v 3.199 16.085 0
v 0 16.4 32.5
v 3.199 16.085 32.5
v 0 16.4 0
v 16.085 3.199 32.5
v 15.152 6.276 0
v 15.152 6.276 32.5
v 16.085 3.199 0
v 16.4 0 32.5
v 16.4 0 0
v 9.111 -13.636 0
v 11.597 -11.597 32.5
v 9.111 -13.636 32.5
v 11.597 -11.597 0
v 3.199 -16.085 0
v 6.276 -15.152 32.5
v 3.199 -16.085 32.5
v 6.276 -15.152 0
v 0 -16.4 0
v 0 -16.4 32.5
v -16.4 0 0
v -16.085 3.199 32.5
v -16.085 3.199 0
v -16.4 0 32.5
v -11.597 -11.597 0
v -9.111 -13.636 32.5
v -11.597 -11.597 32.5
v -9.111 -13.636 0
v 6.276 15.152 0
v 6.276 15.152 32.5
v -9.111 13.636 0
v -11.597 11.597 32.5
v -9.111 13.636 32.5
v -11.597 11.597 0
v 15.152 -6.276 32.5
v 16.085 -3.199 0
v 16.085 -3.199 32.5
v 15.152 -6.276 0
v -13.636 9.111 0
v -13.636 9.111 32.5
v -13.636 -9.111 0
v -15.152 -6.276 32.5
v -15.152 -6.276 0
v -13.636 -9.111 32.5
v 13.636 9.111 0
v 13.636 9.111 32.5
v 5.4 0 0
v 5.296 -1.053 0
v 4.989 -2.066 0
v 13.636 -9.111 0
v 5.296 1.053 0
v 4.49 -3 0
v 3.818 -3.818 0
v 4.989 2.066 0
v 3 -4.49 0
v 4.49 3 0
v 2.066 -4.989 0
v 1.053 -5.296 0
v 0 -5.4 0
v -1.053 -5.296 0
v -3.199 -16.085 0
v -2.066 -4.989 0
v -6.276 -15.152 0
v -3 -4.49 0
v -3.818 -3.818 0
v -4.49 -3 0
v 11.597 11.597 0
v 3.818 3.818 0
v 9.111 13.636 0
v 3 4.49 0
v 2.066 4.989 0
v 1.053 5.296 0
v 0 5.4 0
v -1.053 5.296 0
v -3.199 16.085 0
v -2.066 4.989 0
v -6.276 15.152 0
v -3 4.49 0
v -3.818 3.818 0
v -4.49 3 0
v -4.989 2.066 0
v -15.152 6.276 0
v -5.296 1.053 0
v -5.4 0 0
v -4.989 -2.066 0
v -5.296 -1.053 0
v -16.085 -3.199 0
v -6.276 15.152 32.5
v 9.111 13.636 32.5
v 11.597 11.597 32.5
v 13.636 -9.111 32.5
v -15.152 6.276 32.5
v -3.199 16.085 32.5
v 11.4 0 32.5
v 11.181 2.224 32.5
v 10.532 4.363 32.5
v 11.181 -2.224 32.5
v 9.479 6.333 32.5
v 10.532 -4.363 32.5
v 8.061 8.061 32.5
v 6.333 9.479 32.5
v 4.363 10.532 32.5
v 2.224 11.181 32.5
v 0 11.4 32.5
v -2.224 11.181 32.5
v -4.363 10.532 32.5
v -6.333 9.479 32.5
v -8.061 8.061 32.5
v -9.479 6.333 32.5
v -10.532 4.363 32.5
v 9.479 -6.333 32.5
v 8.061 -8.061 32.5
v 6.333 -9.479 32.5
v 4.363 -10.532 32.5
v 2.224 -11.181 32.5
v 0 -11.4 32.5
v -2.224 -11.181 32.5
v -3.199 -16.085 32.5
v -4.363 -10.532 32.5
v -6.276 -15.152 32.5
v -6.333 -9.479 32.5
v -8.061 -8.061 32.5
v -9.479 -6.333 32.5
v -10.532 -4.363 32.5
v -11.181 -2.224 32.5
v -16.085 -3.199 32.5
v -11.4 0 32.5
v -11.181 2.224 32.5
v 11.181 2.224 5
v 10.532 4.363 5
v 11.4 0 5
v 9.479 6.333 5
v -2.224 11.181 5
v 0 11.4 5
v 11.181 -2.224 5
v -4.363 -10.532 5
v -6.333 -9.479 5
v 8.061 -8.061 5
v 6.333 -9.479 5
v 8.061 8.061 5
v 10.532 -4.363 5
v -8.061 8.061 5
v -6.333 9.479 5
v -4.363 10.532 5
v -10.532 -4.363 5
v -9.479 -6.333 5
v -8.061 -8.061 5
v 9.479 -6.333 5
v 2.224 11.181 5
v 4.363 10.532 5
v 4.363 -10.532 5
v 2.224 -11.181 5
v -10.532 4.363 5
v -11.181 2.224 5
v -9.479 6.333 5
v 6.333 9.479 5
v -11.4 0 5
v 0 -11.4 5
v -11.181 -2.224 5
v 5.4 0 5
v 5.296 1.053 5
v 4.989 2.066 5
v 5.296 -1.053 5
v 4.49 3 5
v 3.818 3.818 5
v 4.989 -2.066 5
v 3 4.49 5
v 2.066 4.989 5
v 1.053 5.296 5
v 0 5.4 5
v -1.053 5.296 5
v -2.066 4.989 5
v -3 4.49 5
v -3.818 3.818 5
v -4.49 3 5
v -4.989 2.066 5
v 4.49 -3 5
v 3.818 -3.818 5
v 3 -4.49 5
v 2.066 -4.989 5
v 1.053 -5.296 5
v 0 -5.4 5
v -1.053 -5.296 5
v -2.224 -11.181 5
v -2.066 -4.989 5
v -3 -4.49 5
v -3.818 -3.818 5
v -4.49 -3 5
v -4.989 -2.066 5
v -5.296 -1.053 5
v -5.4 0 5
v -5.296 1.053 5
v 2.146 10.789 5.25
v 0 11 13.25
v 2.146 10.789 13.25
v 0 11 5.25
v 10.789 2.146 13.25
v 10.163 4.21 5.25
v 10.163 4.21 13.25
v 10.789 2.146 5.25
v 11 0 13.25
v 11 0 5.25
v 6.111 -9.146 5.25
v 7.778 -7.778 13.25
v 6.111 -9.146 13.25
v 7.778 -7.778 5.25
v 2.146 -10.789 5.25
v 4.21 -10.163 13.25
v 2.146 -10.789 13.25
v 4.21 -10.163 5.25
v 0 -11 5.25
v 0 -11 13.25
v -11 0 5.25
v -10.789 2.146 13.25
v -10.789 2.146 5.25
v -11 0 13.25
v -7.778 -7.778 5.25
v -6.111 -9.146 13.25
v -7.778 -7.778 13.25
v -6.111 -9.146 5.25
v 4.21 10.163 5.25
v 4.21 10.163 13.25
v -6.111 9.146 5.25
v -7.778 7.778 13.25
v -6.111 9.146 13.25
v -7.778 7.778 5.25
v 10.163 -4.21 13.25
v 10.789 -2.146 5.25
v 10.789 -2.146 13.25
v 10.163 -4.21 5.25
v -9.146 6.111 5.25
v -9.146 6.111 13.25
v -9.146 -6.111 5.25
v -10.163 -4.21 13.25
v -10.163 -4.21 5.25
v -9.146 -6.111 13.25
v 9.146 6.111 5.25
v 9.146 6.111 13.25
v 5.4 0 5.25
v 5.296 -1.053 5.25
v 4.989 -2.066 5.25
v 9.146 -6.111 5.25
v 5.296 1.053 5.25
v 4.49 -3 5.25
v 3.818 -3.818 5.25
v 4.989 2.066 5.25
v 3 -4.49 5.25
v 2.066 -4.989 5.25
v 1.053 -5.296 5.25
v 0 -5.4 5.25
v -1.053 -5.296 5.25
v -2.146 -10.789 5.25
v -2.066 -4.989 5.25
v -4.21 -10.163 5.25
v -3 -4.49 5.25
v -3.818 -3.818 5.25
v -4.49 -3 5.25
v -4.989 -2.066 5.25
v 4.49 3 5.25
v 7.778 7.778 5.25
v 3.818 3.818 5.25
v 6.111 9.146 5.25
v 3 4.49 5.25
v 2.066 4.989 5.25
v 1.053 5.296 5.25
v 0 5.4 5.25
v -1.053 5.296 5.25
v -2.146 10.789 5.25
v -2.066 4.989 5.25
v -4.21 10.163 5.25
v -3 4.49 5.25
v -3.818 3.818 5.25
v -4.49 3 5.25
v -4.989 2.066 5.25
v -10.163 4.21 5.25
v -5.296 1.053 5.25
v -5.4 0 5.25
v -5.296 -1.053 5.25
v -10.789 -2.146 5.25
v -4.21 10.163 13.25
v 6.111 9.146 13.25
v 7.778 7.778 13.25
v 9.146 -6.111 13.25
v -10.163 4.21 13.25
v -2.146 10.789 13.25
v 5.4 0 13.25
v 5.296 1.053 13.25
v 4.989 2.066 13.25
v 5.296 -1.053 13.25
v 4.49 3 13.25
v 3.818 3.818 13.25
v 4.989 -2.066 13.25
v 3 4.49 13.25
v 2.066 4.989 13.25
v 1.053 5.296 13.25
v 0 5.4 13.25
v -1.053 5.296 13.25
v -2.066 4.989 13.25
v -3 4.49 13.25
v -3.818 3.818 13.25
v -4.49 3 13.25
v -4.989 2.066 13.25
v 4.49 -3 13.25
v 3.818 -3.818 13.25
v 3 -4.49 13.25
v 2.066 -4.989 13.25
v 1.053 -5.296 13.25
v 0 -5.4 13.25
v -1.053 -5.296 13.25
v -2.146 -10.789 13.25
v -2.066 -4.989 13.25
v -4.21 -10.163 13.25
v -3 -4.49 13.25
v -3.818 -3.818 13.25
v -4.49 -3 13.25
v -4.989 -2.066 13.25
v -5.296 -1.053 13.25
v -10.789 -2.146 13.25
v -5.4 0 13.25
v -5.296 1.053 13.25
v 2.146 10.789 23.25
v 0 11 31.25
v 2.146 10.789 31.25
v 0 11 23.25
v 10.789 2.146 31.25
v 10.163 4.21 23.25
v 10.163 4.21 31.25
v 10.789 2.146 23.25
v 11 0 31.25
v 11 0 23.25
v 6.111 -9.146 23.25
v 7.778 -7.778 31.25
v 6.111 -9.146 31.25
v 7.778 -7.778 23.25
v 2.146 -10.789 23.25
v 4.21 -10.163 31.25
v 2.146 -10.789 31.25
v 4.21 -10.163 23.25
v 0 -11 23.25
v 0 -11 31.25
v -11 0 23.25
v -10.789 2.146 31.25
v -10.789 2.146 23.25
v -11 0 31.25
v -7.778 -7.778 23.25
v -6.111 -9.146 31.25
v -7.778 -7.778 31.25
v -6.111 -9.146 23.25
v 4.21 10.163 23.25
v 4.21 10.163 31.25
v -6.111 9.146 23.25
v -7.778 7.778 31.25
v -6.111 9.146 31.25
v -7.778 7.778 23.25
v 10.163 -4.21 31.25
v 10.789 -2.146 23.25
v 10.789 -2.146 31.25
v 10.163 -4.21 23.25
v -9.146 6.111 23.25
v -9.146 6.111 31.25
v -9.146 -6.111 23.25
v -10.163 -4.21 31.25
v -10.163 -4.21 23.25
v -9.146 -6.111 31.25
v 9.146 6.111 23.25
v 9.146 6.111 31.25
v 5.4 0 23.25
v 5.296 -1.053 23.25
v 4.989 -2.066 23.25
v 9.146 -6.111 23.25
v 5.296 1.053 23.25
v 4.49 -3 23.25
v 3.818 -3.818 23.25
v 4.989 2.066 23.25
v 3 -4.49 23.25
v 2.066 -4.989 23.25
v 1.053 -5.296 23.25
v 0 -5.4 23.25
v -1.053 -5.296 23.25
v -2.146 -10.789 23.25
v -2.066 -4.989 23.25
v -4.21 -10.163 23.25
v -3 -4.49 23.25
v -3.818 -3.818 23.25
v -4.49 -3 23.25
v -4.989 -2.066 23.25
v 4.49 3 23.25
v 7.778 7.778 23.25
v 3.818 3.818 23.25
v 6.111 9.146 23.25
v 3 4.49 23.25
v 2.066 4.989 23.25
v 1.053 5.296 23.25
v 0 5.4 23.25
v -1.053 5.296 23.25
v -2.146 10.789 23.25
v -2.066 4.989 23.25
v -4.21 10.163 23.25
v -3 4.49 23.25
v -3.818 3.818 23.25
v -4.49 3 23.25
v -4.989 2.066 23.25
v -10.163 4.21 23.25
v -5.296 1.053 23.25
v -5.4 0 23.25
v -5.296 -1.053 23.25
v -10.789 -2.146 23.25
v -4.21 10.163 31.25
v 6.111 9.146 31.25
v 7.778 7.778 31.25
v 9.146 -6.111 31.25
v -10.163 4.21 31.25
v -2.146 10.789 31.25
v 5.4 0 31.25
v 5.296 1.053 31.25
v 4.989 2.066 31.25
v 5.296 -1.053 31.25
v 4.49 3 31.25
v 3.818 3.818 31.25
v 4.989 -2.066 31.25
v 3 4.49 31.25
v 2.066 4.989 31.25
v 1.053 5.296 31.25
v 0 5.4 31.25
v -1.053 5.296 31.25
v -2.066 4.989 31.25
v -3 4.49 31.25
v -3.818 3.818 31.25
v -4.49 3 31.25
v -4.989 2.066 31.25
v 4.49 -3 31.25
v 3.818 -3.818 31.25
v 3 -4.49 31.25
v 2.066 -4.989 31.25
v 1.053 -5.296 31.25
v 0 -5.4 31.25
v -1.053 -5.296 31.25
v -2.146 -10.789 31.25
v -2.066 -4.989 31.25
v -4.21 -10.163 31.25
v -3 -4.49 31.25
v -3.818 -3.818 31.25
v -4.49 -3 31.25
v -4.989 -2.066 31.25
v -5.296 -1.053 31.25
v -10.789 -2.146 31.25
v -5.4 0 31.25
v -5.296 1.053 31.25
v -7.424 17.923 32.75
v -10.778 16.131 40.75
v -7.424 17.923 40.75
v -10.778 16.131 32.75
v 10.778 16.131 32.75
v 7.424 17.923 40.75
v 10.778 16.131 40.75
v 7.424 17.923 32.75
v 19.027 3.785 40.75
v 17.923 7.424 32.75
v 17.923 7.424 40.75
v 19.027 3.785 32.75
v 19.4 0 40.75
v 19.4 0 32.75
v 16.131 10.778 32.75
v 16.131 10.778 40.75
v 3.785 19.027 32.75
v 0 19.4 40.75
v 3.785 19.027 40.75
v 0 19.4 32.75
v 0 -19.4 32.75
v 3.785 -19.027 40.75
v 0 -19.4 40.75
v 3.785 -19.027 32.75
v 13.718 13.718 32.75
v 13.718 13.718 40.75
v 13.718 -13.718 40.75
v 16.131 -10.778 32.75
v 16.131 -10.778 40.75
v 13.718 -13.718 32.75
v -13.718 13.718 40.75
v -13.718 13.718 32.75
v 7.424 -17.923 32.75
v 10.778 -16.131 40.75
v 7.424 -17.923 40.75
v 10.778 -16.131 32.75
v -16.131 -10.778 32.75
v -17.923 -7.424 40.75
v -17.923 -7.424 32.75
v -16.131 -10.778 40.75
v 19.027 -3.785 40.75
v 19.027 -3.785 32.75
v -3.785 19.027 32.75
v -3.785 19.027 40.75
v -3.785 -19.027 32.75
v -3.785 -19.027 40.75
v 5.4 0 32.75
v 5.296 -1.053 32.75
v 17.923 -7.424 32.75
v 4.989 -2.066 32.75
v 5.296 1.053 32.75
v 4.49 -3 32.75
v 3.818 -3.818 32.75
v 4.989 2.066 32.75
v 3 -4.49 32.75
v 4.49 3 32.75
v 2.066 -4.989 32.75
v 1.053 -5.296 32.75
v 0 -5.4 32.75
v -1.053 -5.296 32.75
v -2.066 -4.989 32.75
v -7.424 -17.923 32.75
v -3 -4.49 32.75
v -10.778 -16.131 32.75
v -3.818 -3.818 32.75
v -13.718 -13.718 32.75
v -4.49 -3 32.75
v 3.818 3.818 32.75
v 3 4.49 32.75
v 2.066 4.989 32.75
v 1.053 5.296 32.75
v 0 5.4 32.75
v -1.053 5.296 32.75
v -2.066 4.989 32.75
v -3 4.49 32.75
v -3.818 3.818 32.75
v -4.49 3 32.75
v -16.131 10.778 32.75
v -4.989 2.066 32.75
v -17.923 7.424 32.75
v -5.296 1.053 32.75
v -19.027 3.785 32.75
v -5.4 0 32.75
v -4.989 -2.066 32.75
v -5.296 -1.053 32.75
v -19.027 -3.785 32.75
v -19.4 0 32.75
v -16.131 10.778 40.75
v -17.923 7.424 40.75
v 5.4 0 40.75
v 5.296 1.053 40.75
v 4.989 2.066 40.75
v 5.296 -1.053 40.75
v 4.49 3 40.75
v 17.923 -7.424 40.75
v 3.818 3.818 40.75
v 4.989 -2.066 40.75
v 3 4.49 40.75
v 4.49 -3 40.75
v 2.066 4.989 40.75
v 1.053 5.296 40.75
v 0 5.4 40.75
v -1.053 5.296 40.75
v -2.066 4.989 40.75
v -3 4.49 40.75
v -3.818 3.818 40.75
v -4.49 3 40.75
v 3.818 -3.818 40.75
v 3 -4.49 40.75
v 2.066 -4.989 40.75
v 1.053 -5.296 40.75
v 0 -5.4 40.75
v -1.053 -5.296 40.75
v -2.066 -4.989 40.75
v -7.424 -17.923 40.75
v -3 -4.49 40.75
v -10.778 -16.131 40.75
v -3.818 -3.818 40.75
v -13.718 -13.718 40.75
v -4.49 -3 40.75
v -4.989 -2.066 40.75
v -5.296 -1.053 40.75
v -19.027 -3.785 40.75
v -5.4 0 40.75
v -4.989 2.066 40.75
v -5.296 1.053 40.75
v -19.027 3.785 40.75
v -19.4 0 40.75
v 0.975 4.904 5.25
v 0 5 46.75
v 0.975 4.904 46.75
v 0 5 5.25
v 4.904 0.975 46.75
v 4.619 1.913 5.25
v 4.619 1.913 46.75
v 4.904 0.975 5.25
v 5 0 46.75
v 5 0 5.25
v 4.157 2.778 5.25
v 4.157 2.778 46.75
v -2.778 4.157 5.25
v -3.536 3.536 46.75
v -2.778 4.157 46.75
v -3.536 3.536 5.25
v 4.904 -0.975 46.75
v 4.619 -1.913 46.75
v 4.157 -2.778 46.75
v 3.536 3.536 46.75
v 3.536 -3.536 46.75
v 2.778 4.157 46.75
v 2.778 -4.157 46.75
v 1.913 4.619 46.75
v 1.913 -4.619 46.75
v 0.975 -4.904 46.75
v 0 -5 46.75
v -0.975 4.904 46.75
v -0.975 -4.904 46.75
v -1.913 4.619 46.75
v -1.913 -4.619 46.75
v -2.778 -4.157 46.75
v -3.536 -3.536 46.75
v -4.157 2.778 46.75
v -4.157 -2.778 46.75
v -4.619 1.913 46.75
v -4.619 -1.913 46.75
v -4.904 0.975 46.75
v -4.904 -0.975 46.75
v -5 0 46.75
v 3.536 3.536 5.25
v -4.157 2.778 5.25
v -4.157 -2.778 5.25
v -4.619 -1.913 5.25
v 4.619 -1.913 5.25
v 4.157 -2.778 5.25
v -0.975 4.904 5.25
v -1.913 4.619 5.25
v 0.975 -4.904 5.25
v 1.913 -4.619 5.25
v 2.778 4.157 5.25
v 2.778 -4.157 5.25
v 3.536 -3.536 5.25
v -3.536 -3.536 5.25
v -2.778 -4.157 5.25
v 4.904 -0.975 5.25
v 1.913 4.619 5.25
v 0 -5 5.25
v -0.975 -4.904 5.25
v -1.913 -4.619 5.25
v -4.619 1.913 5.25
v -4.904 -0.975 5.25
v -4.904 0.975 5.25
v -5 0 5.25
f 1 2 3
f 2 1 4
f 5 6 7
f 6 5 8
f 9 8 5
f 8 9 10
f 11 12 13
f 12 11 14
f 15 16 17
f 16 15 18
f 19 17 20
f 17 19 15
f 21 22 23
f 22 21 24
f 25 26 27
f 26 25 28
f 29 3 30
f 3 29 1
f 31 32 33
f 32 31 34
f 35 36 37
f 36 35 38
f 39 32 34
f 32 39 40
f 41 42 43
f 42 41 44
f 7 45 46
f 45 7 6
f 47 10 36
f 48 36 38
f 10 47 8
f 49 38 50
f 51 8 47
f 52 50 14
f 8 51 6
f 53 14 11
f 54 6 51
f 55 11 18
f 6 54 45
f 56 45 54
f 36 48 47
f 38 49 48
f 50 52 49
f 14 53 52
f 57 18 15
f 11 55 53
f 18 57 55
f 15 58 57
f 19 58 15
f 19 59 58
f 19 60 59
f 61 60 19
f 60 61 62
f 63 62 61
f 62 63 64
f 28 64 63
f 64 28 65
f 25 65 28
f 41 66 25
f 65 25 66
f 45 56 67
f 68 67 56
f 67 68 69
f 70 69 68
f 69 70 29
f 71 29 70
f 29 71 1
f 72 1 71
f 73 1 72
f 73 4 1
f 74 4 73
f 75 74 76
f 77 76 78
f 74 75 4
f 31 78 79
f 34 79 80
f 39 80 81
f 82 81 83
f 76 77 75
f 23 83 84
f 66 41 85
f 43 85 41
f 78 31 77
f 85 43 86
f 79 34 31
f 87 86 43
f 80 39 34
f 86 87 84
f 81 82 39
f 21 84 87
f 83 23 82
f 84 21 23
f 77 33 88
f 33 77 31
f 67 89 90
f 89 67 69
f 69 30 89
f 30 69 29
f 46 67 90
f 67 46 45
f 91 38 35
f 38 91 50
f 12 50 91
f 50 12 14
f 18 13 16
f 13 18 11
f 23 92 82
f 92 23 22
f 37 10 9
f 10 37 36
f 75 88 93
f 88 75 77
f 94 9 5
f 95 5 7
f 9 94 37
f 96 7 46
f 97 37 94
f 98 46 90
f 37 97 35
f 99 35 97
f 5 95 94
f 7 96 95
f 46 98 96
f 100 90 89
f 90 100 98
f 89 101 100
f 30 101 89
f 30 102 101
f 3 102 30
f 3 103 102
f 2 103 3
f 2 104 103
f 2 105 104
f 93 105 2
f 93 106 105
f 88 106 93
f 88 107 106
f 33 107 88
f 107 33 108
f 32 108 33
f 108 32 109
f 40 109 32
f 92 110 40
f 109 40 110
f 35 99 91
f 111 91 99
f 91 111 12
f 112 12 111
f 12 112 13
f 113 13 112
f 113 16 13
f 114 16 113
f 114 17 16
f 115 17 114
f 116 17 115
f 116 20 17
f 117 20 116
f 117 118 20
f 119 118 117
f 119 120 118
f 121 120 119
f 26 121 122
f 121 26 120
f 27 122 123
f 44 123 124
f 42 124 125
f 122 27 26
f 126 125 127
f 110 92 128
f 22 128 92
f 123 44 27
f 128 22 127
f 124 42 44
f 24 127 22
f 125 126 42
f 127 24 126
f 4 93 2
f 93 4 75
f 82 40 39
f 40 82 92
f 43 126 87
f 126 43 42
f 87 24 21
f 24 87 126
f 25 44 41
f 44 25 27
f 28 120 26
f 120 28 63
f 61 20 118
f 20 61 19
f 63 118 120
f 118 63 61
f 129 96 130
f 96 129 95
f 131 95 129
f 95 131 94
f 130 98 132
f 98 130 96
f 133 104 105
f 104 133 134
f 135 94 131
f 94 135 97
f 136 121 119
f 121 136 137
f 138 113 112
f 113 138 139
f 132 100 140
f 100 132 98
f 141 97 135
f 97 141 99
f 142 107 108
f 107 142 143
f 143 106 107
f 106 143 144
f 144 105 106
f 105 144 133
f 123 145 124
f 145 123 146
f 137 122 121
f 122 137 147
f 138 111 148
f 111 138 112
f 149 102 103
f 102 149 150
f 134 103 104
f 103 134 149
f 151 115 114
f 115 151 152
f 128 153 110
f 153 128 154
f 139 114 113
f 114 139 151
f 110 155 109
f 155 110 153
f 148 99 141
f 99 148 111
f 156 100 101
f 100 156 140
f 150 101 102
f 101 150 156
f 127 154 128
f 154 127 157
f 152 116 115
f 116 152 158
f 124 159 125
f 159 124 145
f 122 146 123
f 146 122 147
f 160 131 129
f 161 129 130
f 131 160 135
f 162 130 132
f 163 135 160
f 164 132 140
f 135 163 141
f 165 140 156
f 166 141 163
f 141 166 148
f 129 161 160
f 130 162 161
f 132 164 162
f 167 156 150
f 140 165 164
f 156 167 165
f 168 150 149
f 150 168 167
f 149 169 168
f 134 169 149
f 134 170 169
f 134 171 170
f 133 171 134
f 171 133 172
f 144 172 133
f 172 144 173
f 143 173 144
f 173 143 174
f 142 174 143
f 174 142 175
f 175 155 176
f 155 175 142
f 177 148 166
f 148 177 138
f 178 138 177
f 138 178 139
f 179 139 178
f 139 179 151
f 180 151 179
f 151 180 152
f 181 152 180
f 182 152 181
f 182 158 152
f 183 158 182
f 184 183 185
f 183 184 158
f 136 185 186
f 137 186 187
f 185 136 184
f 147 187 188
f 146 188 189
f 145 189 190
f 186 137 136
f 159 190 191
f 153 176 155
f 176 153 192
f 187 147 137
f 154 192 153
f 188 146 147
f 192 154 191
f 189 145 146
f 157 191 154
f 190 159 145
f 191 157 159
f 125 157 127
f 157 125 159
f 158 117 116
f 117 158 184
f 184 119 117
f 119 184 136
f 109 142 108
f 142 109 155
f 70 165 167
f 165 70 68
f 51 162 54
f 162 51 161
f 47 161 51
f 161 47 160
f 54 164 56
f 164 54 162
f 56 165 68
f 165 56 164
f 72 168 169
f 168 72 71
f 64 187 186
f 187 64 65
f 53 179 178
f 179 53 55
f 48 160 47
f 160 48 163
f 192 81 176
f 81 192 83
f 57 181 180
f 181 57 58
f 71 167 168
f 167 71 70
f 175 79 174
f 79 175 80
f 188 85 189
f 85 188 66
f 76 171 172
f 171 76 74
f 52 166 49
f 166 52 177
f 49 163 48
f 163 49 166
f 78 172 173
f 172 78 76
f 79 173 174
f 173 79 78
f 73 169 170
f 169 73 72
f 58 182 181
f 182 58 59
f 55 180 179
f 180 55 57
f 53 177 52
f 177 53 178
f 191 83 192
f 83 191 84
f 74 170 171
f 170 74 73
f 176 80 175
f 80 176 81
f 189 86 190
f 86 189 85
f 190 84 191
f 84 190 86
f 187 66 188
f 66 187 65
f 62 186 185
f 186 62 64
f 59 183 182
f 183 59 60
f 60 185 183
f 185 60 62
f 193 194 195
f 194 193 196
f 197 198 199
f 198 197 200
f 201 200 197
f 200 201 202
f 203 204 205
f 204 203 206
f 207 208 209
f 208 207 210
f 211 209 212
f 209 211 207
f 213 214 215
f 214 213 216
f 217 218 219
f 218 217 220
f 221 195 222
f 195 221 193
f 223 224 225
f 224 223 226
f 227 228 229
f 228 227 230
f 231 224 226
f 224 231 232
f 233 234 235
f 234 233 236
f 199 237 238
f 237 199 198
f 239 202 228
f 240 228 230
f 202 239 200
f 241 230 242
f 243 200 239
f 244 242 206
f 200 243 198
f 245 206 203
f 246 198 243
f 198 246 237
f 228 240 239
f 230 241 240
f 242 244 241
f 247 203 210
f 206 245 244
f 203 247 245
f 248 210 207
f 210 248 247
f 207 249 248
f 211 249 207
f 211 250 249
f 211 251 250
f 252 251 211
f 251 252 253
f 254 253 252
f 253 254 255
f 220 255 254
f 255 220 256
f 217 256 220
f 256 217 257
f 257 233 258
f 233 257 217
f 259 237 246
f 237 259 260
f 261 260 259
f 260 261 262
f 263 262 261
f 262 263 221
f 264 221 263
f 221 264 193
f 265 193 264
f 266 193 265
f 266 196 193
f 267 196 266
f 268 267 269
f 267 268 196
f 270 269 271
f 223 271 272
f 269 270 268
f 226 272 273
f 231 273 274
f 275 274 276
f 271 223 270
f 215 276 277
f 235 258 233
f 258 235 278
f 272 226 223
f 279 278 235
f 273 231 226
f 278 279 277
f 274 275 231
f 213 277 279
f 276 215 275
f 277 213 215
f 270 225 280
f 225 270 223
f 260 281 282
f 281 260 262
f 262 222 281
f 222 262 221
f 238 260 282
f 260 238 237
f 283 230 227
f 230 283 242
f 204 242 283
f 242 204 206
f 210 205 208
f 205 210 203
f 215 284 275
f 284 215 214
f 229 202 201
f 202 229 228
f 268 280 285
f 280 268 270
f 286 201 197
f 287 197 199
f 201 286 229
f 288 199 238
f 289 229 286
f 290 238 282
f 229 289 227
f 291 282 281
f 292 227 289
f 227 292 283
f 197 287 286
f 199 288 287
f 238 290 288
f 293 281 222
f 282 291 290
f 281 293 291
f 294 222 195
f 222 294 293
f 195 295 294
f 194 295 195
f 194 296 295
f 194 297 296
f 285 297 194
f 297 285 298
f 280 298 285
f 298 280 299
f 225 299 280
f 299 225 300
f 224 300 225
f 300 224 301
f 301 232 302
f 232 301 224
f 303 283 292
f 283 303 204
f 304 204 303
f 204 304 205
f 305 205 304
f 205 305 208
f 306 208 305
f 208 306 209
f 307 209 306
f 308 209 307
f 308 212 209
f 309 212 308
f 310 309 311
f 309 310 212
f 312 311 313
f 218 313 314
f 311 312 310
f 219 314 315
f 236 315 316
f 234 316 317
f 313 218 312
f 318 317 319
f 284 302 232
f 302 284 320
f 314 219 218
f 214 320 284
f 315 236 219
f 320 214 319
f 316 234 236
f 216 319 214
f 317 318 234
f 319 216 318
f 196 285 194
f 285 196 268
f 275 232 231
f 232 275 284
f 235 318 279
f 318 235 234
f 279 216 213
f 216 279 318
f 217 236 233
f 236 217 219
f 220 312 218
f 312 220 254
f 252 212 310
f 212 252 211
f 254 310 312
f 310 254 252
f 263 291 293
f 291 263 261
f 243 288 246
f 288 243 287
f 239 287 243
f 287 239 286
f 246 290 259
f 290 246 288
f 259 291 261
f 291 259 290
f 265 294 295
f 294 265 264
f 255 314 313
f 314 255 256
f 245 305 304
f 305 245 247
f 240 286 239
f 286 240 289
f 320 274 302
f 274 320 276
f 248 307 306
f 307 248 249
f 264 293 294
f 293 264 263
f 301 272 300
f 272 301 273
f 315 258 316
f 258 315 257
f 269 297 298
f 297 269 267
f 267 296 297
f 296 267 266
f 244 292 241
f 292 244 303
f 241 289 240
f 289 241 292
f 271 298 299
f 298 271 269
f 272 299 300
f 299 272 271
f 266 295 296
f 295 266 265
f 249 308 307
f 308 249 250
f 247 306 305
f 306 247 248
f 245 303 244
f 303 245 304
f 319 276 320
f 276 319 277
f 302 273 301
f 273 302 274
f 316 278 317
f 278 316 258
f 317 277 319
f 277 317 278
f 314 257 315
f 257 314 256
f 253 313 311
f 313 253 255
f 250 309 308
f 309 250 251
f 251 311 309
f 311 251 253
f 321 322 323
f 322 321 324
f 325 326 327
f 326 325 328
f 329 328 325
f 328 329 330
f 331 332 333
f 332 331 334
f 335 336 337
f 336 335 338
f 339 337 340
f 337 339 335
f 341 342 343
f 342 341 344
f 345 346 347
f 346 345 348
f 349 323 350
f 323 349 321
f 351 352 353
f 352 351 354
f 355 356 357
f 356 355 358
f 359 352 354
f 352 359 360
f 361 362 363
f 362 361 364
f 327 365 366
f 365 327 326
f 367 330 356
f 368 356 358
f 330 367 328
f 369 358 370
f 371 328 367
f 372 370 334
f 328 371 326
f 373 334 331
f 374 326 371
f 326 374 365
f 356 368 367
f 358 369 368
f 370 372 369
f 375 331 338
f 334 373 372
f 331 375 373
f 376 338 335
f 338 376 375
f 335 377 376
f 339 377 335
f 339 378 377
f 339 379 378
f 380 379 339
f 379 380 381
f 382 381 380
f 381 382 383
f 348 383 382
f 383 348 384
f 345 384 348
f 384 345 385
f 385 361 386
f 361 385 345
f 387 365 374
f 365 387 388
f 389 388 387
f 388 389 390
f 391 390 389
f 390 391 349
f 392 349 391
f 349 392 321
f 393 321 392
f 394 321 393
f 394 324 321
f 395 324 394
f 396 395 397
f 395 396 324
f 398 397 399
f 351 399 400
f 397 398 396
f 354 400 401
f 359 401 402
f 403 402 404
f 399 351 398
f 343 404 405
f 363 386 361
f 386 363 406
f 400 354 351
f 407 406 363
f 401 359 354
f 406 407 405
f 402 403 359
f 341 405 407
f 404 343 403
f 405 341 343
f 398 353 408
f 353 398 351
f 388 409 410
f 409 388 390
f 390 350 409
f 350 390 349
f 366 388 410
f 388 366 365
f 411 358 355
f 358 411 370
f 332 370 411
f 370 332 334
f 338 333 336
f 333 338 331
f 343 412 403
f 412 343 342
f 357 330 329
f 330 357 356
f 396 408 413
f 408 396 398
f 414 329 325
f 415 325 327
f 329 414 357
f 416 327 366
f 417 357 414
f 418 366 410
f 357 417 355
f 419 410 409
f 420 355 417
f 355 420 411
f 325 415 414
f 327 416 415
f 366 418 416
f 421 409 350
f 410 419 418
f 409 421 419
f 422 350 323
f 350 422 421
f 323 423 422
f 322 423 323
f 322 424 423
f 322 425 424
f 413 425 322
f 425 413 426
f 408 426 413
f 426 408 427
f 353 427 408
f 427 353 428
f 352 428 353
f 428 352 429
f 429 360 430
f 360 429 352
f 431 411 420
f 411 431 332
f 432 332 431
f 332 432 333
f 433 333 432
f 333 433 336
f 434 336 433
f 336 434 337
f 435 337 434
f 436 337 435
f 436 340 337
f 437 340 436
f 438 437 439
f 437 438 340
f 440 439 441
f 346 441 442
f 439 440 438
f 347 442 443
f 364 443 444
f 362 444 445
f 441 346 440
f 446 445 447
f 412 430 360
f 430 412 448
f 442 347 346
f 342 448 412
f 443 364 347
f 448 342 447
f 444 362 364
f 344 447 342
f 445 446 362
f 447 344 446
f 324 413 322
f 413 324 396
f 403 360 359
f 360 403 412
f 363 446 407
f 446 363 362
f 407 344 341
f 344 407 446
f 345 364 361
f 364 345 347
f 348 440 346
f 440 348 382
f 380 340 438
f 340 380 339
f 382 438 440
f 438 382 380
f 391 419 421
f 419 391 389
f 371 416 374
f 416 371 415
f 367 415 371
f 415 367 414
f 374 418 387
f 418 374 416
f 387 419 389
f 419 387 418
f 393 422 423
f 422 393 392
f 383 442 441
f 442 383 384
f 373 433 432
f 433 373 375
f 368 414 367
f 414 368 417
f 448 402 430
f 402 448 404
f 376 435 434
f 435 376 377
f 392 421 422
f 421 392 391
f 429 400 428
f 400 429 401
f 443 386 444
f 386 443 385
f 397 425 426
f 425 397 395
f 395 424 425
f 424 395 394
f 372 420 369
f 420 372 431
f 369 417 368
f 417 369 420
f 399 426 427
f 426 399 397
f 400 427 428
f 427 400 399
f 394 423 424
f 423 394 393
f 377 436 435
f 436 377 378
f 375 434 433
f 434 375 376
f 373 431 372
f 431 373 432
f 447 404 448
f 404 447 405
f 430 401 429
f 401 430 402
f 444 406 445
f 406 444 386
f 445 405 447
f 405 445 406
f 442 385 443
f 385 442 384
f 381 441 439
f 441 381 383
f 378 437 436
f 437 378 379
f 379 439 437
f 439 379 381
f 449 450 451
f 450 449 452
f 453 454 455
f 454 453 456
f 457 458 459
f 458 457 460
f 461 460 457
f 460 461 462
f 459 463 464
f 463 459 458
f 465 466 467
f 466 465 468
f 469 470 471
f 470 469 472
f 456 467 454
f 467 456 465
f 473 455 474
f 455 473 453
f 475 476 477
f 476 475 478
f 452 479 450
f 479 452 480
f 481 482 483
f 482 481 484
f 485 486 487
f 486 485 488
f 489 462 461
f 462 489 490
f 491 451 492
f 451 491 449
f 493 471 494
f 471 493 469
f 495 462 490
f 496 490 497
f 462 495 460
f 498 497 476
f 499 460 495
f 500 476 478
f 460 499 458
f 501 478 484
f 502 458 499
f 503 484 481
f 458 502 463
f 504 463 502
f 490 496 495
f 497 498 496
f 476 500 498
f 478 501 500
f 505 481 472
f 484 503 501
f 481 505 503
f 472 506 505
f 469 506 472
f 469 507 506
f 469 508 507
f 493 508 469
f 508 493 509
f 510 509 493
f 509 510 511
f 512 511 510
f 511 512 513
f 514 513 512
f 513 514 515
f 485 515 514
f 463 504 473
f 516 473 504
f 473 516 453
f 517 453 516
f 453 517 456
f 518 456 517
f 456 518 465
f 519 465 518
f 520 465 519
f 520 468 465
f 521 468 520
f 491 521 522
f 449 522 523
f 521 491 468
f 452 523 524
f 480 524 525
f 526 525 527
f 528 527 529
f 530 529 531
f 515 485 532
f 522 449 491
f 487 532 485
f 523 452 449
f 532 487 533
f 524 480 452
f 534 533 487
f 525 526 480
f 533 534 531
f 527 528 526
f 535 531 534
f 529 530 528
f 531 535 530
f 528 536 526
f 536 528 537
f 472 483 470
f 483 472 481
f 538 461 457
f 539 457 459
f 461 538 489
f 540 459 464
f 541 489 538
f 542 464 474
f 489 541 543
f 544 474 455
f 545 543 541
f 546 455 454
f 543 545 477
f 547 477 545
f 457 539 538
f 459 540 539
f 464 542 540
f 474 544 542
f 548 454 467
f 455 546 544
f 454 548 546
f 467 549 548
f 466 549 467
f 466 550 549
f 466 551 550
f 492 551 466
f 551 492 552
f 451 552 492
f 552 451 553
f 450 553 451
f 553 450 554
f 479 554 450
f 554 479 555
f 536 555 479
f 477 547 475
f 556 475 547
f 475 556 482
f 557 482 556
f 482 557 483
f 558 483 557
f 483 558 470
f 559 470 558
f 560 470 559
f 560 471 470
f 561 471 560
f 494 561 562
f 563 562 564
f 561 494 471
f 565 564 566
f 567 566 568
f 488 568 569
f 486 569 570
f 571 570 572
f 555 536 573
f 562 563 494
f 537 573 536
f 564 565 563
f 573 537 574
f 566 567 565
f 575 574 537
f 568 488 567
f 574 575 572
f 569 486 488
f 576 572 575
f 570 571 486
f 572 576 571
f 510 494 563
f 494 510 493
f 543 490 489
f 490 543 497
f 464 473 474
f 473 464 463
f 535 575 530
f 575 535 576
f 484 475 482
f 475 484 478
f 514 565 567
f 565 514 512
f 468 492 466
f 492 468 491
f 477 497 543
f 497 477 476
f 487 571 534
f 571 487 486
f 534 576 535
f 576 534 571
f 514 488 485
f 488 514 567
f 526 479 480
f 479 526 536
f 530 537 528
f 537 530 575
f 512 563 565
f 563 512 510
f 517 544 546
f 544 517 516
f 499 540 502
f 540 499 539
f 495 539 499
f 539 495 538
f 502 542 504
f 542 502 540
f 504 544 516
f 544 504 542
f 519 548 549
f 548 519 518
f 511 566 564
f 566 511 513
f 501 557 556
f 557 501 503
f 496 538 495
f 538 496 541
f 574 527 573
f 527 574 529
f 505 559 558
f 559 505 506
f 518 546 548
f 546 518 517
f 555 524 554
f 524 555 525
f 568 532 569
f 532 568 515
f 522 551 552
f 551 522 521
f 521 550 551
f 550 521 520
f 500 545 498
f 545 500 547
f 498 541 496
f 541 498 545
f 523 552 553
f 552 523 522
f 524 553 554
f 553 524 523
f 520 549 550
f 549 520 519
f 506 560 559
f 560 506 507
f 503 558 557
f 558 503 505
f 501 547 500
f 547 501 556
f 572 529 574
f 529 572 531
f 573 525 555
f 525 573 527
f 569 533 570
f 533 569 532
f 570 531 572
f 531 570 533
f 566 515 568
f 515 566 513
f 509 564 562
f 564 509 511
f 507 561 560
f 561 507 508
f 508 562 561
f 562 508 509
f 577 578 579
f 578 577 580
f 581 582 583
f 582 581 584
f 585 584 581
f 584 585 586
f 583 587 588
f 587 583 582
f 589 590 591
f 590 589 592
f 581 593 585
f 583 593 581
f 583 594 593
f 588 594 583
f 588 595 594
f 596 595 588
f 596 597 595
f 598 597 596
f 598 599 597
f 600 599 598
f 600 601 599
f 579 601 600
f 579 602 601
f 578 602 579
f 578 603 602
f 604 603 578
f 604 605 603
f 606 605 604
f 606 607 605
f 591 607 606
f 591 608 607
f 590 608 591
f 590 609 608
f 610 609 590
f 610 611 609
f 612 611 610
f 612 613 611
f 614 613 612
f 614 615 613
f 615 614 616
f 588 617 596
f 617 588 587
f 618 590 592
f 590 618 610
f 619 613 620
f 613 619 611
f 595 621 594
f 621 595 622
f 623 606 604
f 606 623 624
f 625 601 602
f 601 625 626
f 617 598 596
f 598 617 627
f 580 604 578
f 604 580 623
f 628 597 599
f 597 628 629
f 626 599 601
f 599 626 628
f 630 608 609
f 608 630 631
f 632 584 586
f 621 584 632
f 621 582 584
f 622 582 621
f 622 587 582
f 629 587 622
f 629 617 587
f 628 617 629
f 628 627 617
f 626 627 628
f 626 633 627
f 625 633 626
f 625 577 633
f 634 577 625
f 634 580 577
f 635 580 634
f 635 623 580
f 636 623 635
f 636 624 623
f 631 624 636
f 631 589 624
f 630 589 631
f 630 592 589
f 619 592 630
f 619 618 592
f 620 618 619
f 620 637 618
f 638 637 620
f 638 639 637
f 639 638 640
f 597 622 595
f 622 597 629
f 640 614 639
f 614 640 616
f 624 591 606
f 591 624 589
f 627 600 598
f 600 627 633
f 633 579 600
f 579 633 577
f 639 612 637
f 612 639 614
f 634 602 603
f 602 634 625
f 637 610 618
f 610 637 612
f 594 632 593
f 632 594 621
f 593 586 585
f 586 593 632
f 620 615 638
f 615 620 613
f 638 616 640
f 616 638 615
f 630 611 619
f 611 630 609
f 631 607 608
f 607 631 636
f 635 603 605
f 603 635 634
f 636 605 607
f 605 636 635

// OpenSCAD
$fn = 32;

// ------------------------------------------------------------------------
// Shaft station: cup d32.8 x 32.5 mm, shaft d10
// Every part is its own module, assembly() places every instance.
// ------------------------------------------------------------------------

// --- part 1 ---
module housing_cup() {
  difference() {
    cylinder(h = 32.5, d = 32.8);
    translate([0, 0, 5]) cylinder(h = 28.5, d = 22.8);
    translate([0, 0, -1]) cylinder(h = 7, d = 10.8);
  }
}

// --- part 2 ---
module bearing_lower() {
  difference() {
      translate([0, 0, 0]) cylinder(h = 8, d = 22);
      translate([0, 0, -1]) cylinder(h = 10, d = 10.8);
    }
}

// --- part 3 ---
module bearing_upper() {
  difference() {
      translate([0, 0, 0]) cylinder(h = 8, d = 22);
      translate([0, 0, -1]) cylinder(h = 10, d = 10.8);
    }
}

// --- part 4 ---
module station_shaft() {
  translate([0, 0, -20.75]) cylinder(h = 41.5, d = 10);
}

// --- part 5 ---
module station_cover() {
  difference() {
    cylinder(h = 8, d = 38.8);
    translate([0, 0, -1]) cylinder(h = 10, d = 10.8);
  }
}

// --- assembly ---
module assembly() {
  color([0.80, 0.24, 0.20]) translate([0, 0, 0]) rotate([0, 0, 0]) housing_cup();
  color([0.20, 0.45, 0.75]) translate([0, 0, 5.25]) rotate([0, 0, 0]) bearing_lower();
  color([0.25, 0.62, 0.32]) translate([0, 0, 23.25]) rotate([0, 0, 0]) bearing_upper();
  color([0.92, 0.70, 0.18]) translate([0, 0, 26]) rotate([0, 0, 0]) station_shaft();
  color([0.58, 0.35, 0.70]) translate([0, 0, 32.75]) rotate([0, 0, 0]) station_cover();
}

assembly();
